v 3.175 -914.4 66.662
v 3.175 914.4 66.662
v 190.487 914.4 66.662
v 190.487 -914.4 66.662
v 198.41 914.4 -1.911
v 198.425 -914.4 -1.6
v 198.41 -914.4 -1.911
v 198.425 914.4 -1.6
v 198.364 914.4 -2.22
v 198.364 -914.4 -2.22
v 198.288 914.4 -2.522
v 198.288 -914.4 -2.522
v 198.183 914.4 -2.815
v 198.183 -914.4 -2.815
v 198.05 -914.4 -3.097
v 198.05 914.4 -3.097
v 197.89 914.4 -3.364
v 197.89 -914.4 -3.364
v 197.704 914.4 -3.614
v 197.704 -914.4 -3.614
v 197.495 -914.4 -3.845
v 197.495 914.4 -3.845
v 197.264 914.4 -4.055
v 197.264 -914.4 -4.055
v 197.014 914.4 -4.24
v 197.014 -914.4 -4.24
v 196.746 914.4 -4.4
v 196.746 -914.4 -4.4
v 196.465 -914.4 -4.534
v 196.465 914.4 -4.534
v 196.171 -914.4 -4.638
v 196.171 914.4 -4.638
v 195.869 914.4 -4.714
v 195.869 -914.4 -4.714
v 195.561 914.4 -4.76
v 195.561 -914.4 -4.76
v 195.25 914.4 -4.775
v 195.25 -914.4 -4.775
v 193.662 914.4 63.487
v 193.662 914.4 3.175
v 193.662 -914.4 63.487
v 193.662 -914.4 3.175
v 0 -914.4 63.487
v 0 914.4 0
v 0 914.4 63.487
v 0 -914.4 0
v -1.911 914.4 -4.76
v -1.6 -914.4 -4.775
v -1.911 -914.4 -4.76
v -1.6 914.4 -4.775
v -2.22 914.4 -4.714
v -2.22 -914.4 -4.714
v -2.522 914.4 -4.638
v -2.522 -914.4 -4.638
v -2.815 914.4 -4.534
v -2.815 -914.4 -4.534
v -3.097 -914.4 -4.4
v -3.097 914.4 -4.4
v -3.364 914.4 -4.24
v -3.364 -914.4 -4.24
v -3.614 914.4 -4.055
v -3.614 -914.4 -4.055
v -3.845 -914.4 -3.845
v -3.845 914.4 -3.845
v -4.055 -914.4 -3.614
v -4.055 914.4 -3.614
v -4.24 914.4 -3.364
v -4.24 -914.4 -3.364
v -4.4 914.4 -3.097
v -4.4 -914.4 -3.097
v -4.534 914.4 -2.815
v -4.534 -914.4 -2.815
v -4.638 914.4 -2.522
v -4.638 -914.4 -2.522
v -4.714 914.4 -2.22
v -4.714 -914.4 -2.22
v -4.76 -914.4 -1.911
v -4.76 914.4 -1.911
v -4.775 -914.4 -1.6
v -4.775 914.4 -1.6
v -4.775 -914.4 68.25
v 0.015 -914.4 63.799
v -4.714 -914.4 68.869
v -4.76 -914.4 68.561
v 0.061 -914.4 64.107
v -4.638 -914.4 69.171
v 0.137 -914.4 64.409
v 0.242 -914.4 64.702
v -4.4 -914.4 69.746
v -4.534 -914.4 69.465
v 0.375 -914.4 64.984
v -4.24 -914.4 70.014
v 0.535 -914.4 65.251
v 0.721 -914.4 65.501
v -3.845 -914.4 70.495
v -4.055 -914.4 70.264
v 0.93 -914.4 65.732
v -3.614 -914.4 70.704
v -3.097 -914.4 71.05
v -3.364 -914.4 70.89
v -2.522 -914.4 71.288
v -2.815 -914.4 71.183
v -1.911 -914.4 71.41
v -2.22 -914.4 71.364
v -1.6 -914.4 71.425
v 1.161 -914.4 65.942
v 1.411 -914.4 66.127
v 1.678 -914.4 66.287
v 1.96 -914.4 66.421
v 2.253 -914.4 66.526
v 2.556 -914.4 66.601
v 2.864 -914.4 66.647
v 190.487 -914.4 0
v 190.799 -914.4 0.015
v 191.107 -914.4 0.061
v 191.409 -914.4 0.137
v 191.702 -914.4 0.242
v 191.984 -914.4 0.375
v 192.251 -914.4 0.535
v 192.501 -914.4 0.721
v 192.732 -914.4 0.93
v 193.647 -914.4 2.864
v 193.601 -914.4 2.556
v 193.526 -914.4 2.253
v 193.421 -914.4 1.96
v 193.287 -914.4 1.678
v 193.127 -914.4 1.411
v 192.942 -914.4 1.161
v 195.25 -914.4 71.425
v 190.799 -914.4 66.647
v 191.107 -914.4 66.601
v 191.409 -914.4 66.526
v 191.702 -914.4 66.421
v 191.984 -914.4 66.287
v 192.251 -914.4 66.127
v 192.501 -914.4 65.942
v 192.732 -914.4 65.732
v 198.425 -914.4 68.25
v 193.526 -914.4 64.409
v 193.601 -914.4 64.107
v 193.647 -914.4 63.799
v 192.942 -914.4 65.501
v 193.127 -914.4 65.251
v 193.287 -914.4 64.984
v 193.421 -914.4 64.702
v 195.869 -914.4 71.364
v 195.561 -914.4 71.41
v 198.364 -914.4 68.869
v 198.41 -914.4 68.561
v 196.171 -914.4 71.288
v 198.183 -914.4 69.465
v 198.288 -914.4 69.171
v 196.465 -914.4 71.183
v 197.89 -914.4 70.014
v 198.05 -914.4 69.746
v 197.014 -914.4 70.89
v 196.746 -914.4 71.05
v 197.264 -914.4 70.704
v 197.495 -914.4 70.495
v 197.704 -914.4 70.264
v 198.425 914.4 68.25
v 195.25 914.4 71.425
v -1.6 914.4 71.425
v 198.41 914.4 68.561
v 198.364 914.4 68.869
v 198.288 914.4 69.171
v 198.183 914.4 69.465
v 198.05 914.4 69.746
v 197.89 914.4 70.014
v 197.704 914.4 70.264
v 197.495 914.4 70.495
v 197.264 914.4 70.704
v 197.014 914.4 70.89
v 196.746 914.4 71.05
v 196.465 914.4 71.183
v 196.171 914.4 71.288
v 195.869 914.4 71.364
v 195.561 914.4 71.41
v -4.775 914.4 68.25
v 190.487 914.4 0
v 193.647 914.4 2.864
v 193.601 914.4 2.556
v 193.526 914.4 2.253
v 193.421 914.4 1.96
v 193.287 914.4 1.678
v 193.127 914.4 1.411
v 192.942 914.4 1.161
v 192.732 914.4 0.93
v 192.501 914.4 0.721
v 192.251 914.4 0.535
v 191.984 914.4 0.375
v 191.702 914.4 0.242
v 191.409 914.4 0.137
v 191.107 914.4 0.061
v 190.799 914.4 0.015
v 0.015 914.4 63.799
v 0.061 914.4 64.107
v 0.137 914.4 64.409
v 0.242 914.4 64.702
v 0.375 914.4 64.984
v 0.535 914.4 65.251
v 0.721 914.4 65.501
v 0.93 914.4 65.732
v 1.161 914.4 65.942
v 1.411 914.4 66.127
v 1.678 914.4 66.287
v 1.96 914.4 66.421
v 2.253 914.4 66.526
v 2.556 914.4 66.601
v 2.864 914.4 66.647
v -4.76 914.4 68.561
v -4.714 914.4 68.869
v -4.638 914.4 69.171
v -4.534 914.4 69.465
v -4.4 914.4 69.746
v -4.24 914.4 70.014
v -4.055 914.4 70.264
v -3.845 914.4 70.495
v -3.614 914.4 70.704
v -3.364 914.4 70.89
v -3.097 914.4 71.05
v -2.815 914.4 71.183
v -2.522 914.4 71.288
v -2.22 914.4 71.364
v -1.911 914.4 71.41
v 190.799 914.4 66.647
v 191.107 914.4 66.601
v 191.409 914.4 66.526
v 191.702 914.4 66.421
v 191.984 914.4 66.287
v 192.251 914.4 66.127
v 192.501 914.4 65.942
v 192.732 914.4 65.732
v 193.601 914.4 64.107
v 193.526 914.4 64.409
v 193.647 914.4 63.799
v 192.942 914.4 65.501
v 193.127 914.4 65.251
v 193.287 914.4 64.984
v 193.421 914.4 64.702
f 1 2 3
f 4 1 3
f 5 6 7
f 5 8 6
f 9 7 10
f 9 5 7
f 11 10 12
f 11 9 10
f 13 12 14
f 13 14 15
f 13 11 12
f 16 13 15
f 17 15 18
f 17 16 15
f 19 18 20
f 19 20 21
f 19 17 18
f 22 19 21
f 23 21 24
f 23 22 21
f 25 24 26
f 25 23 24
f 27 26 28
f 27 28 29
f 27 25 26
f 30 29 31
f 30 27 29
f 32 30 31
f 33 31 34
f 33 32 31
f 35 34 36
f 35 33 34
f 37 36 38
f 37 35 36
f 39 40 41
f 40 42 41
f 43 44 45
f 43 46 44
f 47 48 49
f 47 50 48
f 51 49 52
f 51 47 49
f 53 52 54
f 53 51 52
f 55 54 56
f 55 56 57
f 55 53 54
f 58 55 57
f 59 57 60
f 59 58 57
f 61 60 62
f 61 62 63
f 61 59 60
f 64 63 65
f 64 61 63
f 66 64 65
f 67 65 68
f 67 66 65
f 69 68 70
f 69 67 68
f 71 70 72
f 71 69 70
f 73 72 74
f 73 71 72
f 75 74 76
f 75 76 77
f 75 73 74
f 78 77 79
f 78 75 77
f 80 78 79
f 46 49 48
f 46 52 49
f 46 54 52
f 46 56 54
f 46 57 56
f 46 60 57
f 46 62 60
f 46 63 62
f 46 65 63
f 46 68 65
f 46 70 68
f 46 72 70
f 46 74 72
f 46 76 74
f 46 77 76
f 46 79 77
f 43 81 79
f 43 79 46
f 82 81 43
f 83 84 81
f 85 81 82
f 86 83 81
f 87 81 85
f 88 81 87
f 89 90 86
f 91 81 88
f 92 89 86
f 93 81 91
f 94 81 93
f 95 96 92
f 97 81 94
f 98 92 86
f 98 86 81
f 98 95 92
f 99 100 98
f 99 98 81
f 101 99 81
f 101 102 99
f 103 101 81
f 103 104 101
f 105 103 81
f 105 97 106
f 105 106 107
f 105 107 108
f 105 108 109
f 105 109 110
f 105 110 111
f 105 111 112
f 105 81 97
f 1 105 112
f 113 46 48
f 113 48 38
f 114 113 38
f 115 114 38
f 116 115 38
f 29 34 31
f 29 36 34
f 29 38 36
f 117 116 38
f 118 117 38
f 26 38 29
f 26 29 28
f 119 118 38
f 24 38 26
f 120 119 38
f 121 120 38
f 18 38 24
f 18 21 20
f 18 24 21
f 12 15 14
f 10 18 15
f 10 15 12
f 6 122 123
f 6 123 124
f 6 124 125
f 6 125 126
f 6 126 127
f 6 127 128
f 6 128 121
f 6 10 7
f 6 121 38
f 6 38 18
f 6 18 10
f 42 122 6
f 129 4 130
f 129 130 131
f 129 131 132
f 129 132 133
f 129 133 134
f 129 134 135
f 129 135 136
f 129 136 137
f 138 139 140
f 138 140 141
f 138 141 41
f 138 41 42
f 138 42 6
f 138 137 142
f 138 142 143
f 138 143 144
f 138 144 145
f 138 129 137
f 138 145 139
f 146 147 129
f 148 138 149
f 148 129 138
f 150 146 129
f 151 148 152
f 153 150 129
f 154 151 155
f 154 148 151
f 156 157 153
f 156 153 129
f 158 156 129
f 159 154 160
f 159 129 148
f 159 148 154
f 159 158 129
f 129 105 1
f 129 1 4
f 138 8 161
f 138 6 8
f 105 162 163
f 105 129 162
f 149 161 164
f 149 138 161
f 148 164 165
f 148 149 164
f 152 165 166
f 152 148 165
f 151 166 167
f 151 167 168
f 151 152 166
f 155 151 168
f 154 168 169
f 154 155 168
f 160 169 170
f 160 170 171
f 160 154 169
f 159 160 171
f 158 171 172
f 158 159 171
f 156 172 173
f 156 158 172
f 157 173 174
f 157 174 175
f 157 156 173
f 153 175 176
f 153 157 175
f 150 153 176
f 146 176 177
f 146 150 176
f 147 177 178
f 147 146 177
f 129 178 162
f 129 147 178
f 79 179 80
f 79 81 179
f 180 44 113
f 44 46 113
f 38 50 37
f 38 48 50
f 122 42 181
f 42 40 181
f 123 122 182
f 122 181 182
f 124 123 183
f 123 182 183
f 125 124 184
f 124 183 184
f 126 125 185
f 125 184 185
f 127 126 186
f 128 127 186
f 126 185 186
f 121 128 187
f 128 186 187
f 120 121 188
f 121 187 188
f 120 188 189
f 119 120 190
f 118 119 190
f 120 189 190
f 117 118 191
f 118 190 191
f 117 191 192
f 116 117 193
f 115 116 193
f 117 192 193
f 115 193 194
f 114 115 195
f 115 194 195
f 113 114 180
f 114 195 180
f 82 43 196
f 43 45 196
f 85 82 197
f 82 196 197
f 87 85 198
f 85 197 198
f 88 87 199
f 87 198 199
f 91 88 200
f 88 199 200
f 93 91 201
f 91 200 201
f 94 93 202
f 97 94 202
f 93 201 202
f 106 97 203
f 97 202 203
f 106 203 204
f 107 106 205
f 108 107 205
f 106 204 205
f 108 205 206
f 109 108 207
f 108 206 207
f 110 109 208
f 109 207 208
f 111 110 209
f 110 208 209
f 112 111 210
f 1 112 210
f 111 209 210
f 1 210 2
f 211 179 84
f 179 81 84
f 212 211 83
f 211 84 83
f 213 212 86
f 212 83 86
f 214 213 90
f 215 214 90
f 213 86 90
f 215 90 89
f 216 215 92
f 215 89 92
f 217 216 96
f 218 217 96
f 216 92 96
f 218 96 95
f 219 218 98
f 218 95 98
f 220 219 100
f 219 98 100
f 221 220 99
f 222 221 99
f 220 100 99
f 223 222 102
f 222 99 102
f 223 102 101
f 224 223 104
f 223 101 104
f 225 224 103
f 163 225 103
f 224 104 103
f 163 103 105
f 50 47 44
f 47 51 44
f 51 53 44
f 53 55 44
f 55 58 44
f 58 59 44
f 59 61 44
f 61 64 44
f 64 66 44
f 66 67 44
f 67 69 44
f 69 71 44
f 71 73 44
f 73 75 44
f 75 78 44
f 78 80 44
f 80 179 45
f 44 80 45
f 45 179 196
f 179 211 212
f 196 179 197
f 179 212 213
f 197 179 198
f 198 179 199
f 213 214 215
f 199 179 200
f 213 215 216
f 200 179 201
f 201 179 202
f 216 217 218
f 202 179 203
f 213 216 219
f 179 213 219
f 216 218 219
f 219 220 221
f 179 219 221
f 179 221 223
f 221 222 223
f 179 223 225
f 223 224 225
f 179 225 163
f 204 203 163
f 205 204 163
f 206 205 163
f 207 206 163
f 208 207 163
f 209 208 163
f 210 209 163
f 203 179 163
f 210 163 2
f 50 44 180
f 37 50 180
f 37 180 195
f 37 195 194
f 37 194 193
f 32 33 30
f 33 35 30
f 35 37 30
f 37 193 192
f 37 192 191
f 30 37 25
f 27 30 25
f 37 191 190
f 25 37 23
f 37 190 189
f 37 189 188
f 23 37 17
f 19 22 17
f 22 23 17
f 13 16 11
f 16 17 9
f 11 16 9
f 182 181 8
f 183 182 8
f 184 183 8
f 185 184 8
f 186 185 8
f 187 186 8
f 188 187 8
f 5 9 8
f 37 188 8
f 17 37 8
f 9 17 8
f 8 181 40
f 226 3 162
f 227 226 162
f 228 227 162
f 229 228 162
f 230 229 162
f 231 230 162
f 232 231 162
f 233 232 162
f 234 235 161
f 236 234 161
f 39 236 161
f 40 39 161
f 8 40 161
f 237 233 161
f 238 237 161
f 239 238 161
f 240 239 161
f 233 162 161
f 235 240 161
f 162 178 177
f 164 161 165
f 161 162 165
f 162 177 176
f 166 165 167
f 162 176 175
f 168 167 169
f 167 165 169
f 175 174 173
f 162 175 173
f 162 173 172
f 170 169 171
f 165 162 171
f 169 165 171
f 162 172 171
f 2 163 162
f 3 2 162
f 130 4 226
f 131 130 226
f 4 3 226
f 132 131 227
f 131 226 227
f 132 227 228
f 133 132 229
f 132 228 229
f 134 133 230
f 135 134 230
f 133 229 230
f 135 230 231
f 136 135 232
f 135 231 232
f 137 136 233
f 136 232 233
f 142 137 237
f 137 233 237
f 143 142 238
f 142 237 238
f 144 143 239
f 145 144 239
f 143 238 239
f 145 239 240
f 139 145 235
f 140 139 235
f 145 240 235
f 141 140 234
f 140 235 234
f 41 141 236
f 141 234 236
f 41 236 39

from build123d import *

# Parameters (mm, degrees)
F0_W     = 193.6623
F0_H     = 66.6623
F1_DEPTH = 914.4
F2_R     = 3.175


with BuildPart() as f1:
    # F0 (on Front) → F1 (new body, symmetric)
    with BuildSketch(Plane.XZ):
        Polygon((198.4248, -4.7752), (198.4248, 66.6623), (198.4248, 71.4248), (-4.7752, 71.4248), (-4.7752, -4.7752), align=None)
        with Locations((96.83115, 33.33115)):
            Rectangle(F0_W, F0_H, mode=Mode.SUBTRACT)
    extrude(amount=F1_DEPTH, both=True)

    # F2
    f2_edges = [f1.edges().sort_by_distance(p)[0] for p in [
        (-4.7752, 0, 71.4248),
        (0, 0, 66.6623),
        (-4.7752, 0, -4.7752),
        (198.4248, 0, -4.7752),
        (198.4248, 0, 71.4248),
        (193.6623, 0, 0),
        (193.6623, 0, 66.6623),
    ]]
    fillet(f2_edges, radius=F2_R)


solid = f1.part
